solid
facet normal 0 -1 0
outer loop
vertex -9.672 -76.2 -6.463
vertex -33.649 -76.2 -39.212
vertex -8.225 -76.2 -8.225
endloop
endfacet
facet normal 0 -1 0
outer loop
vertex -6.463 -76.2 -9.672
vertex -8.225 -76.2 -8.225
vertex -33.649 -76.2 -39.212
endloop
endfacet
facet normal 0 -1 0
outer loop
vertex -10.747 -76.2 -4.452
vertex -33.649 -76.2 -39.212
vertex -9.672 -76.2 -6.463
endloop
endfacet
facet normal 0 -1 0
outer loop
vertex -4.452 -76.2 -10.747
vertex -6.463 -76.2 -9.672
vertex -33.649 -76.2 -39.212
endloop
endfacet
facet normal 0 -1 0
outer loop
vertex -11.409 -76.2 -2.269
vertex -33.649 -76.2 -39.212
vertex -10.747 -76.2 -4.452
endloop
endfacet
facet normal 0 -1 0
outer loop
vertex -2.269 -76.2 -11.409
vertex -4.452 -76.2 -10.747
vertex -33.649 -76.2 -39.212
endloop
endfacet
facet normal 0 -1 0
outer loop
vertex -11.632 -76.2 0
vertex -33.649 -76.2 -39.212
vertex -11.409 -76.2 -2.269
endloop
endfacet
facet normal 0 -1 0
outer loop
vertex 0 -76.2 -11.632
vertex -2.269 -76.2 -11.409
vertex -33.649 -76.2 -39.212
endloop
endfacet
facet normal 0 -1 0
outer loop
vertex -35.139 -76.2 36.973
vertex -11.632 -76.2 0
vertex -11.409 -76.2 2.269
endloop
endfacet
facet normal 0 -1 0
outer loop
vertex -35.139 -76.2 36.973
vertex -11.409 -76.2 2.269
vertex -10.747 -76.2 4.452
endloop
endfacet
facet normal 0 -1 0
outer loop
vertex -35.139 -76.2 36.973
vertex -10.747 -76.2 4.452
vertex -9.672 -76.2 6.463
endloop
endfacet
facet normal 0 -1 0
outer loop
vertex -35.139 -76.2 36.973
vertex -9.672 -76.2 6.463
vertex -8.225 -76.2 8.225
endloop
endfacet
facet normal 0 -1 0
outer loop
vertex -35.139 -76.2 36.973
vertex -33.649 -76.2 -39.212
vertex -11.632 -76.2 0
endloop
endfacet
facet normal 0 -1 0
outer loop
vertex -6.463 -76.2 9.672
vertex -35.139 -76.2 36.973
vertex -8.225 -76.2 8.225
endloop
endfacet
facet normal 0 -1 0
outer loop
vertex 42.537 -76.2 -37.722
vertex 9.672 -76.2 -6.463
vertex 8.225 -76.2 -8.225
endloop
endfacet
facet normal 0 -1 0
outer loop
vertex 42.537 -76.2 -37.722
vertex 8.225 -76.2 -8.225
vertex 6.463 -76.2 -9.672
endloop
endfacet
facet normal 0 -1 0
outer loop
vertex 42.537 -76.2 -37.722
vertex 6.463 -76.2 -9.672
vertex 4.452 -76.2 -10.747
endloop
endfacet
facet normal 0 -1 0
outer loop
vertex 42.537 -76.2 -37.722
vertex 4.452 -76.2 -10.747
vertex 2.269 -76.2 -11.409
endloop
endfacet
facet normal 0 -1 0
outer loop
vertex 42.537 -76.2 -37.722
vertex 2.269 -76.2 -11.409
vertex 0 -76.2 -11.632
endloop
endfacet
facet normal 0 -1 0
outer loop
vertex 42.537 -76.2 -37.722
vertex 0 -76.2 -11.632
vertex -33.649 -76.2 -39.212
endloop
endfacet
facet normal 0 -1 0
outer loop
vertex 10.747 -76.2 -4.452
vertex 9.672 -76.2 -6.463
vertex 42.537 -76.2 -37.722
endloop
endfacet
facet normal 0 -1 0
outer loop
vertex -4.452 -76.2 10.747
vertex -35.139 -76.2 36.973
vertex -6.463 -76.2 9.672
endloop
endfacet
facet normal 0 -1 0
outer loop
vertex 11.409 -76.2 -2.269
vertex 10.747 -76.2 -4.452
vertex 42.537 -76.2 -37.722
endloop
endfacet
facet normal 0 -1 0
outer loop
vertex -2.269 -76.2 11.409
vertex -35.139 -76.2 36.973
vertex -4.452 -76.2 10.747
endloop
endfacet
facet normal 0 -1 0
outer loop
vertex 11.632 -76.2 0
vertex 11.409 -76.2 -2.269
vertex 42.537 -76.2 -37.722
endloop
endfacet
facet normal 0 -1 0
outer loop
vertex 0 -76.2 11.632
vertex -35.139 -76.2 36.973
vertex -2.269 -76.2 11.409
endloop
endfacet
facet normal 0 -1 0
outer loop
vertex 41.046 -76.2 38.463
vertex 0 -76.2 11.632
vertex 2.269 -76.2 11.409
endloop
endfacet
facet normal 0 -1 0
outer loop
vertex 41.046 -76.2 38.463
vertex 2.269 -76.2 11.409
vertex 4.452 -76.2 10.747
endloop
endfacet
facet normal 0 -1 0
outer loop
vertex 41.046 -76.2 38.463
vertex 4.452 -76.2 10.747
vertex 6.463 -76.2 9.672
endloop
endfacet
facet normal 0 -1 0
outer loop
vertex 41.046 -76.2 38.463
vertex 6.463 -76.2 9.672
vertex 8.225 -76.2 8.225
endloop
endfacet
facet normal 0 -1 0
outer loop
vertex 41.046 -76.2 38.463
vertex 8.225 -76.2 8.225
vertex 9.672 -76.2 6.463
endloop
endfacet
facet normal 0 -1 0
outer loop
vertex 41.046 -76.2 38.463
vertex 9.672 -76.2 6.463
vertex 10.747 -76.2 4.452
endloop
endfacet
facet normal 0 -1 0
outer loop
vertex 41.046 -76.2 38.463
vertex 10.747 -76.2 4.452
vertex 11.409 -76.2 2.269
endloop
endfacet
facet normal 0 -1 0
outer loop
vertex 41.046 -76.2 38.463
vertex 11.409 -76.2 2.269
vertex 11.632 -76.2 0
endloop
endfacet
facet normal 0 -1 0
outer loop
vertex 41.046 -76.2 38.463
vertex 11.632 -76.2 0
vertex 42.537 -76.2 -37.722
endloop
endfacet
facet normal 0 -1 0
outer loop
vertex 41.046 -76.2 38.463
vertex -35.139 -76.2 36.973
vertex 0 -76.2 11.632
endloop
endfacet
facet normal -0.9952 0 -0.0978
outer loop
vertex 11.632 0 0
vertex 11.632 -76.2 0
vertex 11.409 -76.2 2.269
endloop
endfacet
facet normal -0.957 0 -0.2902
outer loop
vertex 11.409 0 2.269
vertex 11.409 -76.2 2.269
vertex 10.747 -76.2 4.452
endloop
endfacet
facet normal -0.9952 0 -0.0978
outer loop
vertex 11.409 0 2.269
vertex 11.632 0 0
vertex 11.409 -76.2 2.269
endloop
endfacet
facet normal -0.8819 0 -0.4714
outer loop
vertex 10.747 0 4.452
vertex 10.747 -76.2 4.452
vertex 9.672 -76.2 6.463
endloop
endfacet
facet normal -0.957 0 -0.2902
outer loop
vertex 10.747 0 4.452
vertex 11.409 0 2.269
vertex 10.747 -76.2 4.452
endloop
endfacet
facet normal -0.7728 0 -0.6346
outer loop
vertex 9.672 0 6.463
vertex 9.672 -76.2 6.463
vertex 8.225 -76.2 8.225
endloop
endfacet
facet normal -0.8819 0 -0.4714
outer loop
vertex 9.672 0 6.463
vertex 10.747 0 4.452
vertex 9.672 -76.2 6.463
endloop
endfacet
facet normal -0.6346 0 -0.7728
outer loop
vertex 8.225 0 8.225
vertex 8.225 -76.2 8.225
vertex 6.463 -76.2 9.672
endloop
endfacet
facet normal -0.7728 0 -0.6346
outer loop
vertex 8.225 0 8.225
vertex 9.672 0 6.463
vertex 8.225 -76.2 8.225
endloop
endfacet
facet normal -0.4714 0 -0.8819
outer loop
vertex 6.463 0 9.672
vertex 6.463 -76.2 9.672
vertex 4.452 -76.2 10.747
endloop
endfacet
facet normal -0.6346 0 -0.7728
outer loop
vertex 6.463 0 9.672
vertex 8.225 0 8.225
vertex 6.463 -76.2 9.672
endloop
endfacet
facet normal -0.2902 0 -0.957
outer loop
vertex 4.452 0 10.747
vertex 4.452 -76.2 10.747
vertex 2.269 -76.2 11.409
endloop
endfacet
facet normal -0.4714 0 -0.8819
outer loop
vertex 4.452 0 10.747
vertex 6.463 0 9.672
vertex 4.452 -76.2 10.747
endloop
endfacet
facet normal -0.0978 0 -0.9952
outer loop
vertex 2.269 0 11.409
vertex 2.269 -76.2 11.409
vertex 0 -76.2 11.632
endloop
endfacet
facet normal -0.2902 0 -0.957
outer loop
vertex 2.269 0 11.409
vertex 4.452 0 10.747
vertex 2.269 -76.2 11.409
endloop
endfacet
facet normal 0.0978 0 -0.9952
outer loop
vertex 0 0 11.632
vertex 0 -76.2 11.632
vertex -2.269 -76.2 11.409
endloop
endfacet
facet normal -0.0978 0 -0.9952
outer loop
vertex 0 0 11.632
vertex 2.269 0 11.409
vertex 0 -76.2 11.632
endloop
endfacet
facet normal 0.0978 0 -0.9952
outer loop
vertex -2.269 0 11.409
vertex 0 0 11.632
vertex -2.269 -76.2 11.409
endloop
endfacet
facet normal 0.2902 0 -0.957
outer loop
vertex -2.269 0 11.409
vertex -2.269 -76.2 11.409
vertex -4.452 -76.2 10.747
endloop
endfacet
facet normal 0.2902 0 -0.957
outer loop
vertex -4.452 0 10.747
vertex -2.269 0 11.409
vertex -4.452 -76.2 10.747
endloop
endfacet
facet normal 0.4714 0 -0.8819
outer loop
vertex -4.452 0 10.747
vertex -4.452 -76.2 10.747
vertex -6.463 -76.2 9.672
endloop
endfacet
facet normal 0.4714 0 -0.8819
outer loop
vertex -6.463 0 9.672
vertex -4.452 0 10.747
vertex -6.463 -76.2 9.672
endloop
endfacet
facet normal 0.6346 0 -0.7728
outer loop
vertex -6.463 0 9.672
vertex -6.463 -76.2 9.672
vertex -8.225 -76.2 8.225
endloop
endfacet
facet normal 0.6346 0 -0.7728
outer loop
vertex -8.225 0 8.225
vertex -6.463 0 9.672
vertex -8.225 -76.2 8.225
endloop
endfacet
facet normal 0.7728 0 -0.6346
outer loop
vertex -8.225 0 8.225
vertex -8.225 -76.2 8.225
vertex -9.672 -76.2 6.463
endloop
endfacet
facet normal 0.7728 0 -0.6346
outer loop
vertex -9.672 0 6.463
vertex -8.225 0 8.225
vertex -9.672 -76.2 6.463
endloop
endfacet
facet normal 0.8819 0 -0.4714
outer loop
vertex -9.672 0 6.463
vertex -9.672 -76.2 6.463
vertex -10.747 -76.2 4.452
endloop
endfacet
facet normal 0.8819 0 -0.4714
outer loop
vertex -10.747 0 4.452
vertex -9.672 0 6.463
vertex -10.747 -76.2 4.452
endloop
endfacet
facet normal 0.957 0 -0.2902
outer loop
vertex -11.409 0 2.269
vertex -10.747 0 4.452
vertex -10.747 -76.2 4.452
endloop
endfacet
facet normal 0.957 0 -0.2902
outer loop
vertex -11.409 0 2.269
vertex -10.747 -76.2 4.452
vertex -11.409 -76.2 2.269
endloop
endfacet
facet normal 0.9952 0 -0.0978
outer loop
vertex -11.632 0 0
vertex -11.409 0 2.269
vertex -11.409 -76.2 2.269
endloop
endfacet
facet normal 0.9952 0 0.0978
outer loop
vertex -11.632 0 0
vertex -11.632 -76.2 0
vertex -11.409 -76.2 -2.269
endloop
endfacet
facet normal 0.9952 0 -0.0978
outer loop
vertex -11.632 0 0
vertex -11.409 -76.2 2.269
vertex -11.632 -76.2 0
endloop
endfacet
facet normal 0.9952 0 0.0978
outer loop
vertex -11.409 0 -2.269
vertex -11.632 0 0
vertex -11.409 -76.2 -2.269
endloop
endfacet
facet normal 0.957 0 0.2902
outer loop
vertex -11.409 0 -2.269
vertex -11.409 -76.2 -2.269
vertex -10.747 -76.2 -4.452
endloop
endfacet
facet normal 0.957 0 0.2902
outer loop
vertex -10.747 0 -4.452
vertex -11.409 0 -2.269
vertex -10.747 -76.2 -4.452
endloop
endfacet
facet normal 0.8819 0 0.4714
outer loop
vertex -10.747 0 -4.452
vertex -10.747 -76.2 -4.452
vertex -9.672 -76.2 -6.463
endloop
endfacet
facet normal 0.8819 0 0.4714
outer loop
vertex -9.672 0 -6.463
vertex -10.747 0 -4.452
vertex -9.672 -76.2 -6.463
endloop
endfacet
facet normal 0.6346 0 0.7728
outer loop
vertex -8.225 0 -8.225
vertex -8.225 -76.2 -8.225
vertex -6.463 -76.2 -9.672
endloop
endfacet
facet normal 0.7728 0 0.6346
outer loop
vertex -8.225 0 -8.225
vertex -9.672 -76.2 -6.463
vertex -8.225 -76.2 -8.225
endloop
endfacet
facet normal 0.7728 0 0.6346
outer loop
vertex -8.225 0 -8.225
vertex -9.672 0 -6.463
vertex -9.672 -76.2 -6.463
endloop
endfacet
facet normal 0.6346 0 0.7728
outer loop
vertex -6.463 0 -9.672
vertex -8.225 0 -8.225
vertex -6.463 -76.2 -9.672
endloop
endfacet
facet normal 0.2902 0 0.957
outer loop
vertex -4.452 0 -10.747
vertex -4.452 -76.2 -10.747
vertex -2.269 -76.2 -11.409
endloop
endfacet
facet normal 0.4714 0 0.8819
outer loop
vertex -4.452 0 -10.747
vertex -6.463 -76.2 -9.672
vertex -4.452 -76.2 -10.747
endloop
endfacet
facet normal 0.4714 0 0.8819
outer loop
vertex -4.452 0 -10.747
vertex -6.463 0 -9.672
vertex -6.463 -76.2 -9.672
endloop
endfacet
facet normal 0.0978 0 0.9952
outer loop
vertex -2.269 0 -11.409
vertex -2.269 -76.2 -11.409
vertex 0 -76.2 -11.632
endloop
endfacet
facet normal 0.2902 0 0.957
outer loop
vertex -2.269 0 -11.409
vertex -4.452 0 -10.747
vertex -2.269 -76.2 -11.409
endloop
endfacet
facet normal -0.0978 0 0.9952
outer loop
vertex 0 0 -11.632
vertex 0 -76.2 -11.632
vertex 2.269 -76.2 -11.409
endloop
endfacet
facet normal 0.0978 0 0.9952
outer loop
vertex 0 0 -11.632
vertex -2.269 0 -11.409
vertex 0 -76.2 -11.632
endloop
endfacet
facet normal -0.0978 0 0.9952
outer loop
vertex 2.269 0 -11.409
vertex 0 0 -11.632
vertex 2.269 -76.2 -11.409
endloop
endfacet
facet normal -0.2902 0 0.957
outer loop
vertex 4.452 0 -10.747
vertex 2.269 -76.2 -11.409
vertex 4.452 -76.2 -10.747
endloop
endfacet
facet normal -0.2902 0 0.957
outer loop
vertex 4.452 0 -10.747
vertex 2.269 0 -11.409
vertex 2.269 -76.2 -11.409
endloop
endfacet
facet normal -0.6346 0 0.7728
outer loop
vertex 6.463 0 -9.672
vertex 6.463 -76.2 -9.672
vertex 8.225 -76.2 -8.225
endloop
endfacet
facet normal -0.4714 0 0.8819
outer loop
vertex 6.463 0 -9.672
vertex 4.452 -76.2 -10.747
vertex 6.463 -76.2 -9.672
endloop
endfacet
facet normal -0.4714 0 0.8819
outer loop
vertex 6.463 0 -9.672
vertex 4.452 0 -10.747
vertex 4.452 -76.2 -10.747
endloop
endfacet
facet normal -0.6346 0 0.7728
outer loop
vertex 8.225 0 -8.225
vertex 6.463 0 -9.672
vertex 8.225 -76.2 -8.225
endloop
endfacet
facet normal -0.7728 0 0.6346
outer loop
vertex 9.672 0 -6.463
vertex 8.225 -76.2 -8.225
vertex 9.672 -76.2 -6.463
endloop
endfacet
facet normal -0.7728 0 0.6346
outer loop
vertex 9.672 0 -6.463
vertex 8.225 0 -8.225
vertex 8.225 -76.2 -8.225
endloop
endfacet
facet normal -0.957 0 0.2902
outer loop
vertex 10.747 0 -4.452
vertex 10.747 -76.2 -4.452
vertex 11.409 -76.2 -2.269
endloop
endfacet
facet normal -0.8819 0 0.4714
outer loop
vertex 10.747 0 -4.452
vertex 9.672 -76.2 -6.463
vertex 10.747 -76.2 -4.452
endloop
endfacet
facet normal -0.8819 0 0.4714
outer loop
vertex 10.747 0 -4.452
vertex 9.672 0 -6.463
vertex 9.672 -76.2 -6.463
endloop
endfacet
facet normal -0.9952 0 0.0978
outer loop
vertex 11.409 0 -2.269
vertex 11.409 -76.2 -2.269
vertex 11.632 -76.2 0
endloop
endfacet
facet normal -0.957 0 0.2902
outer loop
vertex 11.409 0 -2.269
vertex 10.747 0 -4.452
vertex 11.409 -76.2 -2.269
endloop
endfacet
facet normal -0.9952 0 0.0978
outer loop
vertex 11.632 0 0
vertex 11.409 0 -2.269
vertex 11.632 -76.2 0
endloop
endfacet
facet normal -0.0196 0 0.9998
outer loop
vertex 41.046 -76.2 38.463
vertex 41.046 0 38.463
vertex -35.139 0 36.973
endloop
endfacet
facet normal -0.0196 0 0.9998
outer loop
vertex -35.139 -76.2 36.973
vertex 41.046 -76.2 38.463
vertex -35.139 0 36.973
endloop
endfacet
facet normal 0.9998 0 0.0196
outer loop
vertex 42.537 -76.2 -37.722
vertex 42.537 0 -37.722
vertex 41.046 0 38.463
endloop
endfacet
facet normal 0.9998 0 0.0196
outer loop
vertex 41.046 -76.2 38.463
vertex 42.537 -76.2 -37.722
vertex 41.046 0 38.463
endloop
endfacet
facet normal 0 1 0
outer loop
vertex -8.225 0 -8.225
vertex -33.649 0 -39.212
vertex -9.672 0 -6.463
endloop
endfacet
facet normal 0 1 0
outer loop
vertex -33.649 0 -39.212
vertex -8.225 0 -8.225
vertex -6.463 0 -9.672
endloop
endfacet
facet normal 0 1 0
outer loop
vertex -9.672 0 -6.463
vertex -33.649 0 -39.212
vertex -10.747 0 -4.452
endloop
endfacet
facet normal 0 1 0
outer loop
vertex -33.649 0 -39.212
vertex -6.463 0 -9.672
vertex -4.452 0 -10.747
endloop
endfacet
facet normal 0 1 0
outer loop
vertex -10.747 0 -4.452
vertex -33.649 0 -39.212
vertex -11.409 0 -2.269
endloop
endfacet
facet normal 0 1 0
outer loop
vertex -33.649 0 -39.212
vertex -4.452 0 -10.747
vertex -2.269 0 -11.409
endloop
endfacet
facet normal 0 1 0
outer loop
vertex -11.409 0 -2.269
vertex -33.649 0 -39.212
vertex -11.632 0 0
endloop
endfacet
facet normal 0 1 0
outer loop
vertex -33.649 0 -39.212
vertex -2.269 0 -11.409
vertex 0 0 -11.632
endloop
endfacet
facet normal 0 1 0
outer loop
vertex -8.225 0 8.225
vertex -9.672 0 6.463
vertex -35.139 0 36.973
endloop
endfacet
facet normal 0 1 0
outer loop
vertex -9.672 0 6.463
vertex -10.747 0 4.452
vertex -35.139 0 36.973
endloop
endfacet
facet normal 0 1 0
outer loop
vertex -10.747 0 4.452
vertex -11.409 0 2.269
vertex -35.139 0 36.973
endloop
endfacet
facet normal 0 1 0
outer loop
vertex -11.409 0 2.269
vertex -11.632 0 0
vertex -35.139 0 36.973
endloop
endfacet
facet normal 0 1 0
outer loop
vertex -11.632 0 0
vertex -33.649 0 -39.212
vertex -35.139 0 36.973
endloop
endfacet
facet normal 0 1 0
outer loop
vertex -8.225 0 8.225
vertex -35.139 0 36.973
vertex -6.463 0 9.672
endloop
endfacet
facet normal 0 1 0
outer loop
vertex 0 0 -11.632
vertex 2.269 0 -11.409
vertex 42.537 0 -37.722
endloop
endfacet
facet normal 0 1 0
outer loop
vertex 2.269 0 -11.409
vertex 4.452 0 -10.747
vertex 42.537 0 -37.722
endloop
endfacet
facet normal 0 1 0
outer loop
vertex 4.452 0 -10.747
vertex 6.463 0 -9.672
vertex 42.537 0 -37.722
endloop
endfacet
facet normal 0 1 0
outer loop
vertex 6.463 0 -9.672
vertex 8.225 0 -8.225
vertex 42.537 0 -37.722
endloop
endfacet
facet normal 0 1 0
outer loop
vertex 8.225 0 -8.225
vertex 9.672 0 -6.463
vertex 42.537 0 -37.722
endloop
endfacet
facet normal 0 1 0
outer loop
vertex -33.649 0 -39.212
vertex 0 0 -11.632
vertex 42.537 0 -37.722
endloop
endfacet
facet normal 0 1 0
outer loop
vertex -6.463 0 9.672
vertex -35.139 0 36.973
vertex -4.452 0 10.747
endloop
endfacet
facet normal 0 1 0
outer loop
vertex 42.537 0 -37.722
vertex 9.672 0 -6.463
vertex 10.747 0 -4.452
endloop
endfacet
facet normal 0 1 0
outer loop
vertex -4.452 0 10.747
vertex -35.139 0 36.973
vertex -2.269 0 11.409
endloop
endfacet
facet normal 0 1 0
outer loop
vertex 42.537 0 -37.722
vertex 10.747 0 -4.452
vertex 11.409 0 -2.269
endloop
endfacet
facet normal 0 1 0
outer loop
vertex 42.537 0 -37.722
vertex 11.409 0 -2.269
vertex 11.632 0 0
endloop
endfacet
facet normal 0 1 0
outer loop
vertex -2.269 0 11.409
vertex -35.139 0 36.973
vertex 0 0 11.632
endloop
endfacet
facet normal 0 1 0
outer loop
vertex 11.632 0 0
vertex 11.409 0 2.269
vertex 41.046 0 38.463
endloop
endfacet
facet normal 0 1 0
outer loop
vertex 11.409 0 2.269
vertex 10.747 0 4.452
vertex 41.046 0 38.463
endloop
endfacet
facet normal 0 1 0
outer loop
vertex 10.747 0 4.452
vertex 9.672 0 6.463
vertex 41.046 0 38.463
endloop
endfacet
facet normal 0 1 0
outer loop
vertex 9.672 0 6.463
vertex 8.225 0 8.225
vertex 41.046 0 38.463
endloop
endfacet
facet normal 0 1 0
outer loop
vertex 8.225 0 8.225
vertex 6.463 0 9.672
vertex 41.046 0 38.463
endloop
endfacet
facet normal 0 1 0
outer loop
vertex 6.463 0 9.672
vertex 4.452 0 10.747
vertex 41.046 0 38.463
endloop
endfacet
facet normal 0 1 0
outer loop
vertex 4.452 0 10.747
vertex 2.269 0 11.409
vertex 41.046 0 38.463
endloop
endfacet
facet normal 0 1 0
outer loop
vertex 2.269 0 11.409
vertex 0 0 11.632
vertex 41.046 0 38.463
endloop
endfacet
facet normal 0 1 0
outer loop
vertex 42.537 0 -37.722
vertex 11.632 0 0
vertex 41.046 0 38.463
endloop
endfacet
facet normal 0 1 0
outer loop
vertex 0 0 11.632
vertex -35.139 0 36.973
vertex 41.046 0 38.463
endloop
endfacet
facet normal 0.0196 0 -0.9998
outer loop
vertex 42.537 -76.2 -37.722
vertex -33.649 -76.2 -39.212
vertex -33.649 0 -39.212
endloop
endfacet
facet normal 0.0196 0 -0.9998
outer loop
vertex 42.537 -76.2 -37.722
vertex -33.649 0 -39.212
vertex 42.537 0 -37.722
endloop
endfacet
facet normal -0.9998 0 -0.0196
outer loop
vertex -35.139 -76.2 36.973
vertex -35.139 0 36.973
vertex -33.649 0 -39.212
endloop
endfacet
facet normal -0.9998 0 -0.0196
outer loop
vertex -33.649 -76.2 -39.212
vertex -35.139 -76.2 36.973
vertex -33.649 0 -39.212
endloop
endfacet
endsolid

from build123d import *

# Parameters (mm, degrees)
F1_DEPTH = 76.2
F2_R     = 11.632497
F3_DEPTH = 84.582


with BuildPart() as f1:
    # F0 (on Front) → F1 (new body)
    with BuildSketch(Plane.XZ):
        Polygon((41.046472, 38.463472), (-35.138952, 36.973097), (-33.648576, -39.212327), (42.536847, -37.721951), align=None)
    extrude(amount=F1_DEPTH)

    # F2 (on Front) → F3 (cut)
    with BuildSketch(Plane.XZ):
        Circle(F2_R)
    extrude(amount=F3_DEPTH, mode=Mode.SUBTRACT)


solid = f1.part
